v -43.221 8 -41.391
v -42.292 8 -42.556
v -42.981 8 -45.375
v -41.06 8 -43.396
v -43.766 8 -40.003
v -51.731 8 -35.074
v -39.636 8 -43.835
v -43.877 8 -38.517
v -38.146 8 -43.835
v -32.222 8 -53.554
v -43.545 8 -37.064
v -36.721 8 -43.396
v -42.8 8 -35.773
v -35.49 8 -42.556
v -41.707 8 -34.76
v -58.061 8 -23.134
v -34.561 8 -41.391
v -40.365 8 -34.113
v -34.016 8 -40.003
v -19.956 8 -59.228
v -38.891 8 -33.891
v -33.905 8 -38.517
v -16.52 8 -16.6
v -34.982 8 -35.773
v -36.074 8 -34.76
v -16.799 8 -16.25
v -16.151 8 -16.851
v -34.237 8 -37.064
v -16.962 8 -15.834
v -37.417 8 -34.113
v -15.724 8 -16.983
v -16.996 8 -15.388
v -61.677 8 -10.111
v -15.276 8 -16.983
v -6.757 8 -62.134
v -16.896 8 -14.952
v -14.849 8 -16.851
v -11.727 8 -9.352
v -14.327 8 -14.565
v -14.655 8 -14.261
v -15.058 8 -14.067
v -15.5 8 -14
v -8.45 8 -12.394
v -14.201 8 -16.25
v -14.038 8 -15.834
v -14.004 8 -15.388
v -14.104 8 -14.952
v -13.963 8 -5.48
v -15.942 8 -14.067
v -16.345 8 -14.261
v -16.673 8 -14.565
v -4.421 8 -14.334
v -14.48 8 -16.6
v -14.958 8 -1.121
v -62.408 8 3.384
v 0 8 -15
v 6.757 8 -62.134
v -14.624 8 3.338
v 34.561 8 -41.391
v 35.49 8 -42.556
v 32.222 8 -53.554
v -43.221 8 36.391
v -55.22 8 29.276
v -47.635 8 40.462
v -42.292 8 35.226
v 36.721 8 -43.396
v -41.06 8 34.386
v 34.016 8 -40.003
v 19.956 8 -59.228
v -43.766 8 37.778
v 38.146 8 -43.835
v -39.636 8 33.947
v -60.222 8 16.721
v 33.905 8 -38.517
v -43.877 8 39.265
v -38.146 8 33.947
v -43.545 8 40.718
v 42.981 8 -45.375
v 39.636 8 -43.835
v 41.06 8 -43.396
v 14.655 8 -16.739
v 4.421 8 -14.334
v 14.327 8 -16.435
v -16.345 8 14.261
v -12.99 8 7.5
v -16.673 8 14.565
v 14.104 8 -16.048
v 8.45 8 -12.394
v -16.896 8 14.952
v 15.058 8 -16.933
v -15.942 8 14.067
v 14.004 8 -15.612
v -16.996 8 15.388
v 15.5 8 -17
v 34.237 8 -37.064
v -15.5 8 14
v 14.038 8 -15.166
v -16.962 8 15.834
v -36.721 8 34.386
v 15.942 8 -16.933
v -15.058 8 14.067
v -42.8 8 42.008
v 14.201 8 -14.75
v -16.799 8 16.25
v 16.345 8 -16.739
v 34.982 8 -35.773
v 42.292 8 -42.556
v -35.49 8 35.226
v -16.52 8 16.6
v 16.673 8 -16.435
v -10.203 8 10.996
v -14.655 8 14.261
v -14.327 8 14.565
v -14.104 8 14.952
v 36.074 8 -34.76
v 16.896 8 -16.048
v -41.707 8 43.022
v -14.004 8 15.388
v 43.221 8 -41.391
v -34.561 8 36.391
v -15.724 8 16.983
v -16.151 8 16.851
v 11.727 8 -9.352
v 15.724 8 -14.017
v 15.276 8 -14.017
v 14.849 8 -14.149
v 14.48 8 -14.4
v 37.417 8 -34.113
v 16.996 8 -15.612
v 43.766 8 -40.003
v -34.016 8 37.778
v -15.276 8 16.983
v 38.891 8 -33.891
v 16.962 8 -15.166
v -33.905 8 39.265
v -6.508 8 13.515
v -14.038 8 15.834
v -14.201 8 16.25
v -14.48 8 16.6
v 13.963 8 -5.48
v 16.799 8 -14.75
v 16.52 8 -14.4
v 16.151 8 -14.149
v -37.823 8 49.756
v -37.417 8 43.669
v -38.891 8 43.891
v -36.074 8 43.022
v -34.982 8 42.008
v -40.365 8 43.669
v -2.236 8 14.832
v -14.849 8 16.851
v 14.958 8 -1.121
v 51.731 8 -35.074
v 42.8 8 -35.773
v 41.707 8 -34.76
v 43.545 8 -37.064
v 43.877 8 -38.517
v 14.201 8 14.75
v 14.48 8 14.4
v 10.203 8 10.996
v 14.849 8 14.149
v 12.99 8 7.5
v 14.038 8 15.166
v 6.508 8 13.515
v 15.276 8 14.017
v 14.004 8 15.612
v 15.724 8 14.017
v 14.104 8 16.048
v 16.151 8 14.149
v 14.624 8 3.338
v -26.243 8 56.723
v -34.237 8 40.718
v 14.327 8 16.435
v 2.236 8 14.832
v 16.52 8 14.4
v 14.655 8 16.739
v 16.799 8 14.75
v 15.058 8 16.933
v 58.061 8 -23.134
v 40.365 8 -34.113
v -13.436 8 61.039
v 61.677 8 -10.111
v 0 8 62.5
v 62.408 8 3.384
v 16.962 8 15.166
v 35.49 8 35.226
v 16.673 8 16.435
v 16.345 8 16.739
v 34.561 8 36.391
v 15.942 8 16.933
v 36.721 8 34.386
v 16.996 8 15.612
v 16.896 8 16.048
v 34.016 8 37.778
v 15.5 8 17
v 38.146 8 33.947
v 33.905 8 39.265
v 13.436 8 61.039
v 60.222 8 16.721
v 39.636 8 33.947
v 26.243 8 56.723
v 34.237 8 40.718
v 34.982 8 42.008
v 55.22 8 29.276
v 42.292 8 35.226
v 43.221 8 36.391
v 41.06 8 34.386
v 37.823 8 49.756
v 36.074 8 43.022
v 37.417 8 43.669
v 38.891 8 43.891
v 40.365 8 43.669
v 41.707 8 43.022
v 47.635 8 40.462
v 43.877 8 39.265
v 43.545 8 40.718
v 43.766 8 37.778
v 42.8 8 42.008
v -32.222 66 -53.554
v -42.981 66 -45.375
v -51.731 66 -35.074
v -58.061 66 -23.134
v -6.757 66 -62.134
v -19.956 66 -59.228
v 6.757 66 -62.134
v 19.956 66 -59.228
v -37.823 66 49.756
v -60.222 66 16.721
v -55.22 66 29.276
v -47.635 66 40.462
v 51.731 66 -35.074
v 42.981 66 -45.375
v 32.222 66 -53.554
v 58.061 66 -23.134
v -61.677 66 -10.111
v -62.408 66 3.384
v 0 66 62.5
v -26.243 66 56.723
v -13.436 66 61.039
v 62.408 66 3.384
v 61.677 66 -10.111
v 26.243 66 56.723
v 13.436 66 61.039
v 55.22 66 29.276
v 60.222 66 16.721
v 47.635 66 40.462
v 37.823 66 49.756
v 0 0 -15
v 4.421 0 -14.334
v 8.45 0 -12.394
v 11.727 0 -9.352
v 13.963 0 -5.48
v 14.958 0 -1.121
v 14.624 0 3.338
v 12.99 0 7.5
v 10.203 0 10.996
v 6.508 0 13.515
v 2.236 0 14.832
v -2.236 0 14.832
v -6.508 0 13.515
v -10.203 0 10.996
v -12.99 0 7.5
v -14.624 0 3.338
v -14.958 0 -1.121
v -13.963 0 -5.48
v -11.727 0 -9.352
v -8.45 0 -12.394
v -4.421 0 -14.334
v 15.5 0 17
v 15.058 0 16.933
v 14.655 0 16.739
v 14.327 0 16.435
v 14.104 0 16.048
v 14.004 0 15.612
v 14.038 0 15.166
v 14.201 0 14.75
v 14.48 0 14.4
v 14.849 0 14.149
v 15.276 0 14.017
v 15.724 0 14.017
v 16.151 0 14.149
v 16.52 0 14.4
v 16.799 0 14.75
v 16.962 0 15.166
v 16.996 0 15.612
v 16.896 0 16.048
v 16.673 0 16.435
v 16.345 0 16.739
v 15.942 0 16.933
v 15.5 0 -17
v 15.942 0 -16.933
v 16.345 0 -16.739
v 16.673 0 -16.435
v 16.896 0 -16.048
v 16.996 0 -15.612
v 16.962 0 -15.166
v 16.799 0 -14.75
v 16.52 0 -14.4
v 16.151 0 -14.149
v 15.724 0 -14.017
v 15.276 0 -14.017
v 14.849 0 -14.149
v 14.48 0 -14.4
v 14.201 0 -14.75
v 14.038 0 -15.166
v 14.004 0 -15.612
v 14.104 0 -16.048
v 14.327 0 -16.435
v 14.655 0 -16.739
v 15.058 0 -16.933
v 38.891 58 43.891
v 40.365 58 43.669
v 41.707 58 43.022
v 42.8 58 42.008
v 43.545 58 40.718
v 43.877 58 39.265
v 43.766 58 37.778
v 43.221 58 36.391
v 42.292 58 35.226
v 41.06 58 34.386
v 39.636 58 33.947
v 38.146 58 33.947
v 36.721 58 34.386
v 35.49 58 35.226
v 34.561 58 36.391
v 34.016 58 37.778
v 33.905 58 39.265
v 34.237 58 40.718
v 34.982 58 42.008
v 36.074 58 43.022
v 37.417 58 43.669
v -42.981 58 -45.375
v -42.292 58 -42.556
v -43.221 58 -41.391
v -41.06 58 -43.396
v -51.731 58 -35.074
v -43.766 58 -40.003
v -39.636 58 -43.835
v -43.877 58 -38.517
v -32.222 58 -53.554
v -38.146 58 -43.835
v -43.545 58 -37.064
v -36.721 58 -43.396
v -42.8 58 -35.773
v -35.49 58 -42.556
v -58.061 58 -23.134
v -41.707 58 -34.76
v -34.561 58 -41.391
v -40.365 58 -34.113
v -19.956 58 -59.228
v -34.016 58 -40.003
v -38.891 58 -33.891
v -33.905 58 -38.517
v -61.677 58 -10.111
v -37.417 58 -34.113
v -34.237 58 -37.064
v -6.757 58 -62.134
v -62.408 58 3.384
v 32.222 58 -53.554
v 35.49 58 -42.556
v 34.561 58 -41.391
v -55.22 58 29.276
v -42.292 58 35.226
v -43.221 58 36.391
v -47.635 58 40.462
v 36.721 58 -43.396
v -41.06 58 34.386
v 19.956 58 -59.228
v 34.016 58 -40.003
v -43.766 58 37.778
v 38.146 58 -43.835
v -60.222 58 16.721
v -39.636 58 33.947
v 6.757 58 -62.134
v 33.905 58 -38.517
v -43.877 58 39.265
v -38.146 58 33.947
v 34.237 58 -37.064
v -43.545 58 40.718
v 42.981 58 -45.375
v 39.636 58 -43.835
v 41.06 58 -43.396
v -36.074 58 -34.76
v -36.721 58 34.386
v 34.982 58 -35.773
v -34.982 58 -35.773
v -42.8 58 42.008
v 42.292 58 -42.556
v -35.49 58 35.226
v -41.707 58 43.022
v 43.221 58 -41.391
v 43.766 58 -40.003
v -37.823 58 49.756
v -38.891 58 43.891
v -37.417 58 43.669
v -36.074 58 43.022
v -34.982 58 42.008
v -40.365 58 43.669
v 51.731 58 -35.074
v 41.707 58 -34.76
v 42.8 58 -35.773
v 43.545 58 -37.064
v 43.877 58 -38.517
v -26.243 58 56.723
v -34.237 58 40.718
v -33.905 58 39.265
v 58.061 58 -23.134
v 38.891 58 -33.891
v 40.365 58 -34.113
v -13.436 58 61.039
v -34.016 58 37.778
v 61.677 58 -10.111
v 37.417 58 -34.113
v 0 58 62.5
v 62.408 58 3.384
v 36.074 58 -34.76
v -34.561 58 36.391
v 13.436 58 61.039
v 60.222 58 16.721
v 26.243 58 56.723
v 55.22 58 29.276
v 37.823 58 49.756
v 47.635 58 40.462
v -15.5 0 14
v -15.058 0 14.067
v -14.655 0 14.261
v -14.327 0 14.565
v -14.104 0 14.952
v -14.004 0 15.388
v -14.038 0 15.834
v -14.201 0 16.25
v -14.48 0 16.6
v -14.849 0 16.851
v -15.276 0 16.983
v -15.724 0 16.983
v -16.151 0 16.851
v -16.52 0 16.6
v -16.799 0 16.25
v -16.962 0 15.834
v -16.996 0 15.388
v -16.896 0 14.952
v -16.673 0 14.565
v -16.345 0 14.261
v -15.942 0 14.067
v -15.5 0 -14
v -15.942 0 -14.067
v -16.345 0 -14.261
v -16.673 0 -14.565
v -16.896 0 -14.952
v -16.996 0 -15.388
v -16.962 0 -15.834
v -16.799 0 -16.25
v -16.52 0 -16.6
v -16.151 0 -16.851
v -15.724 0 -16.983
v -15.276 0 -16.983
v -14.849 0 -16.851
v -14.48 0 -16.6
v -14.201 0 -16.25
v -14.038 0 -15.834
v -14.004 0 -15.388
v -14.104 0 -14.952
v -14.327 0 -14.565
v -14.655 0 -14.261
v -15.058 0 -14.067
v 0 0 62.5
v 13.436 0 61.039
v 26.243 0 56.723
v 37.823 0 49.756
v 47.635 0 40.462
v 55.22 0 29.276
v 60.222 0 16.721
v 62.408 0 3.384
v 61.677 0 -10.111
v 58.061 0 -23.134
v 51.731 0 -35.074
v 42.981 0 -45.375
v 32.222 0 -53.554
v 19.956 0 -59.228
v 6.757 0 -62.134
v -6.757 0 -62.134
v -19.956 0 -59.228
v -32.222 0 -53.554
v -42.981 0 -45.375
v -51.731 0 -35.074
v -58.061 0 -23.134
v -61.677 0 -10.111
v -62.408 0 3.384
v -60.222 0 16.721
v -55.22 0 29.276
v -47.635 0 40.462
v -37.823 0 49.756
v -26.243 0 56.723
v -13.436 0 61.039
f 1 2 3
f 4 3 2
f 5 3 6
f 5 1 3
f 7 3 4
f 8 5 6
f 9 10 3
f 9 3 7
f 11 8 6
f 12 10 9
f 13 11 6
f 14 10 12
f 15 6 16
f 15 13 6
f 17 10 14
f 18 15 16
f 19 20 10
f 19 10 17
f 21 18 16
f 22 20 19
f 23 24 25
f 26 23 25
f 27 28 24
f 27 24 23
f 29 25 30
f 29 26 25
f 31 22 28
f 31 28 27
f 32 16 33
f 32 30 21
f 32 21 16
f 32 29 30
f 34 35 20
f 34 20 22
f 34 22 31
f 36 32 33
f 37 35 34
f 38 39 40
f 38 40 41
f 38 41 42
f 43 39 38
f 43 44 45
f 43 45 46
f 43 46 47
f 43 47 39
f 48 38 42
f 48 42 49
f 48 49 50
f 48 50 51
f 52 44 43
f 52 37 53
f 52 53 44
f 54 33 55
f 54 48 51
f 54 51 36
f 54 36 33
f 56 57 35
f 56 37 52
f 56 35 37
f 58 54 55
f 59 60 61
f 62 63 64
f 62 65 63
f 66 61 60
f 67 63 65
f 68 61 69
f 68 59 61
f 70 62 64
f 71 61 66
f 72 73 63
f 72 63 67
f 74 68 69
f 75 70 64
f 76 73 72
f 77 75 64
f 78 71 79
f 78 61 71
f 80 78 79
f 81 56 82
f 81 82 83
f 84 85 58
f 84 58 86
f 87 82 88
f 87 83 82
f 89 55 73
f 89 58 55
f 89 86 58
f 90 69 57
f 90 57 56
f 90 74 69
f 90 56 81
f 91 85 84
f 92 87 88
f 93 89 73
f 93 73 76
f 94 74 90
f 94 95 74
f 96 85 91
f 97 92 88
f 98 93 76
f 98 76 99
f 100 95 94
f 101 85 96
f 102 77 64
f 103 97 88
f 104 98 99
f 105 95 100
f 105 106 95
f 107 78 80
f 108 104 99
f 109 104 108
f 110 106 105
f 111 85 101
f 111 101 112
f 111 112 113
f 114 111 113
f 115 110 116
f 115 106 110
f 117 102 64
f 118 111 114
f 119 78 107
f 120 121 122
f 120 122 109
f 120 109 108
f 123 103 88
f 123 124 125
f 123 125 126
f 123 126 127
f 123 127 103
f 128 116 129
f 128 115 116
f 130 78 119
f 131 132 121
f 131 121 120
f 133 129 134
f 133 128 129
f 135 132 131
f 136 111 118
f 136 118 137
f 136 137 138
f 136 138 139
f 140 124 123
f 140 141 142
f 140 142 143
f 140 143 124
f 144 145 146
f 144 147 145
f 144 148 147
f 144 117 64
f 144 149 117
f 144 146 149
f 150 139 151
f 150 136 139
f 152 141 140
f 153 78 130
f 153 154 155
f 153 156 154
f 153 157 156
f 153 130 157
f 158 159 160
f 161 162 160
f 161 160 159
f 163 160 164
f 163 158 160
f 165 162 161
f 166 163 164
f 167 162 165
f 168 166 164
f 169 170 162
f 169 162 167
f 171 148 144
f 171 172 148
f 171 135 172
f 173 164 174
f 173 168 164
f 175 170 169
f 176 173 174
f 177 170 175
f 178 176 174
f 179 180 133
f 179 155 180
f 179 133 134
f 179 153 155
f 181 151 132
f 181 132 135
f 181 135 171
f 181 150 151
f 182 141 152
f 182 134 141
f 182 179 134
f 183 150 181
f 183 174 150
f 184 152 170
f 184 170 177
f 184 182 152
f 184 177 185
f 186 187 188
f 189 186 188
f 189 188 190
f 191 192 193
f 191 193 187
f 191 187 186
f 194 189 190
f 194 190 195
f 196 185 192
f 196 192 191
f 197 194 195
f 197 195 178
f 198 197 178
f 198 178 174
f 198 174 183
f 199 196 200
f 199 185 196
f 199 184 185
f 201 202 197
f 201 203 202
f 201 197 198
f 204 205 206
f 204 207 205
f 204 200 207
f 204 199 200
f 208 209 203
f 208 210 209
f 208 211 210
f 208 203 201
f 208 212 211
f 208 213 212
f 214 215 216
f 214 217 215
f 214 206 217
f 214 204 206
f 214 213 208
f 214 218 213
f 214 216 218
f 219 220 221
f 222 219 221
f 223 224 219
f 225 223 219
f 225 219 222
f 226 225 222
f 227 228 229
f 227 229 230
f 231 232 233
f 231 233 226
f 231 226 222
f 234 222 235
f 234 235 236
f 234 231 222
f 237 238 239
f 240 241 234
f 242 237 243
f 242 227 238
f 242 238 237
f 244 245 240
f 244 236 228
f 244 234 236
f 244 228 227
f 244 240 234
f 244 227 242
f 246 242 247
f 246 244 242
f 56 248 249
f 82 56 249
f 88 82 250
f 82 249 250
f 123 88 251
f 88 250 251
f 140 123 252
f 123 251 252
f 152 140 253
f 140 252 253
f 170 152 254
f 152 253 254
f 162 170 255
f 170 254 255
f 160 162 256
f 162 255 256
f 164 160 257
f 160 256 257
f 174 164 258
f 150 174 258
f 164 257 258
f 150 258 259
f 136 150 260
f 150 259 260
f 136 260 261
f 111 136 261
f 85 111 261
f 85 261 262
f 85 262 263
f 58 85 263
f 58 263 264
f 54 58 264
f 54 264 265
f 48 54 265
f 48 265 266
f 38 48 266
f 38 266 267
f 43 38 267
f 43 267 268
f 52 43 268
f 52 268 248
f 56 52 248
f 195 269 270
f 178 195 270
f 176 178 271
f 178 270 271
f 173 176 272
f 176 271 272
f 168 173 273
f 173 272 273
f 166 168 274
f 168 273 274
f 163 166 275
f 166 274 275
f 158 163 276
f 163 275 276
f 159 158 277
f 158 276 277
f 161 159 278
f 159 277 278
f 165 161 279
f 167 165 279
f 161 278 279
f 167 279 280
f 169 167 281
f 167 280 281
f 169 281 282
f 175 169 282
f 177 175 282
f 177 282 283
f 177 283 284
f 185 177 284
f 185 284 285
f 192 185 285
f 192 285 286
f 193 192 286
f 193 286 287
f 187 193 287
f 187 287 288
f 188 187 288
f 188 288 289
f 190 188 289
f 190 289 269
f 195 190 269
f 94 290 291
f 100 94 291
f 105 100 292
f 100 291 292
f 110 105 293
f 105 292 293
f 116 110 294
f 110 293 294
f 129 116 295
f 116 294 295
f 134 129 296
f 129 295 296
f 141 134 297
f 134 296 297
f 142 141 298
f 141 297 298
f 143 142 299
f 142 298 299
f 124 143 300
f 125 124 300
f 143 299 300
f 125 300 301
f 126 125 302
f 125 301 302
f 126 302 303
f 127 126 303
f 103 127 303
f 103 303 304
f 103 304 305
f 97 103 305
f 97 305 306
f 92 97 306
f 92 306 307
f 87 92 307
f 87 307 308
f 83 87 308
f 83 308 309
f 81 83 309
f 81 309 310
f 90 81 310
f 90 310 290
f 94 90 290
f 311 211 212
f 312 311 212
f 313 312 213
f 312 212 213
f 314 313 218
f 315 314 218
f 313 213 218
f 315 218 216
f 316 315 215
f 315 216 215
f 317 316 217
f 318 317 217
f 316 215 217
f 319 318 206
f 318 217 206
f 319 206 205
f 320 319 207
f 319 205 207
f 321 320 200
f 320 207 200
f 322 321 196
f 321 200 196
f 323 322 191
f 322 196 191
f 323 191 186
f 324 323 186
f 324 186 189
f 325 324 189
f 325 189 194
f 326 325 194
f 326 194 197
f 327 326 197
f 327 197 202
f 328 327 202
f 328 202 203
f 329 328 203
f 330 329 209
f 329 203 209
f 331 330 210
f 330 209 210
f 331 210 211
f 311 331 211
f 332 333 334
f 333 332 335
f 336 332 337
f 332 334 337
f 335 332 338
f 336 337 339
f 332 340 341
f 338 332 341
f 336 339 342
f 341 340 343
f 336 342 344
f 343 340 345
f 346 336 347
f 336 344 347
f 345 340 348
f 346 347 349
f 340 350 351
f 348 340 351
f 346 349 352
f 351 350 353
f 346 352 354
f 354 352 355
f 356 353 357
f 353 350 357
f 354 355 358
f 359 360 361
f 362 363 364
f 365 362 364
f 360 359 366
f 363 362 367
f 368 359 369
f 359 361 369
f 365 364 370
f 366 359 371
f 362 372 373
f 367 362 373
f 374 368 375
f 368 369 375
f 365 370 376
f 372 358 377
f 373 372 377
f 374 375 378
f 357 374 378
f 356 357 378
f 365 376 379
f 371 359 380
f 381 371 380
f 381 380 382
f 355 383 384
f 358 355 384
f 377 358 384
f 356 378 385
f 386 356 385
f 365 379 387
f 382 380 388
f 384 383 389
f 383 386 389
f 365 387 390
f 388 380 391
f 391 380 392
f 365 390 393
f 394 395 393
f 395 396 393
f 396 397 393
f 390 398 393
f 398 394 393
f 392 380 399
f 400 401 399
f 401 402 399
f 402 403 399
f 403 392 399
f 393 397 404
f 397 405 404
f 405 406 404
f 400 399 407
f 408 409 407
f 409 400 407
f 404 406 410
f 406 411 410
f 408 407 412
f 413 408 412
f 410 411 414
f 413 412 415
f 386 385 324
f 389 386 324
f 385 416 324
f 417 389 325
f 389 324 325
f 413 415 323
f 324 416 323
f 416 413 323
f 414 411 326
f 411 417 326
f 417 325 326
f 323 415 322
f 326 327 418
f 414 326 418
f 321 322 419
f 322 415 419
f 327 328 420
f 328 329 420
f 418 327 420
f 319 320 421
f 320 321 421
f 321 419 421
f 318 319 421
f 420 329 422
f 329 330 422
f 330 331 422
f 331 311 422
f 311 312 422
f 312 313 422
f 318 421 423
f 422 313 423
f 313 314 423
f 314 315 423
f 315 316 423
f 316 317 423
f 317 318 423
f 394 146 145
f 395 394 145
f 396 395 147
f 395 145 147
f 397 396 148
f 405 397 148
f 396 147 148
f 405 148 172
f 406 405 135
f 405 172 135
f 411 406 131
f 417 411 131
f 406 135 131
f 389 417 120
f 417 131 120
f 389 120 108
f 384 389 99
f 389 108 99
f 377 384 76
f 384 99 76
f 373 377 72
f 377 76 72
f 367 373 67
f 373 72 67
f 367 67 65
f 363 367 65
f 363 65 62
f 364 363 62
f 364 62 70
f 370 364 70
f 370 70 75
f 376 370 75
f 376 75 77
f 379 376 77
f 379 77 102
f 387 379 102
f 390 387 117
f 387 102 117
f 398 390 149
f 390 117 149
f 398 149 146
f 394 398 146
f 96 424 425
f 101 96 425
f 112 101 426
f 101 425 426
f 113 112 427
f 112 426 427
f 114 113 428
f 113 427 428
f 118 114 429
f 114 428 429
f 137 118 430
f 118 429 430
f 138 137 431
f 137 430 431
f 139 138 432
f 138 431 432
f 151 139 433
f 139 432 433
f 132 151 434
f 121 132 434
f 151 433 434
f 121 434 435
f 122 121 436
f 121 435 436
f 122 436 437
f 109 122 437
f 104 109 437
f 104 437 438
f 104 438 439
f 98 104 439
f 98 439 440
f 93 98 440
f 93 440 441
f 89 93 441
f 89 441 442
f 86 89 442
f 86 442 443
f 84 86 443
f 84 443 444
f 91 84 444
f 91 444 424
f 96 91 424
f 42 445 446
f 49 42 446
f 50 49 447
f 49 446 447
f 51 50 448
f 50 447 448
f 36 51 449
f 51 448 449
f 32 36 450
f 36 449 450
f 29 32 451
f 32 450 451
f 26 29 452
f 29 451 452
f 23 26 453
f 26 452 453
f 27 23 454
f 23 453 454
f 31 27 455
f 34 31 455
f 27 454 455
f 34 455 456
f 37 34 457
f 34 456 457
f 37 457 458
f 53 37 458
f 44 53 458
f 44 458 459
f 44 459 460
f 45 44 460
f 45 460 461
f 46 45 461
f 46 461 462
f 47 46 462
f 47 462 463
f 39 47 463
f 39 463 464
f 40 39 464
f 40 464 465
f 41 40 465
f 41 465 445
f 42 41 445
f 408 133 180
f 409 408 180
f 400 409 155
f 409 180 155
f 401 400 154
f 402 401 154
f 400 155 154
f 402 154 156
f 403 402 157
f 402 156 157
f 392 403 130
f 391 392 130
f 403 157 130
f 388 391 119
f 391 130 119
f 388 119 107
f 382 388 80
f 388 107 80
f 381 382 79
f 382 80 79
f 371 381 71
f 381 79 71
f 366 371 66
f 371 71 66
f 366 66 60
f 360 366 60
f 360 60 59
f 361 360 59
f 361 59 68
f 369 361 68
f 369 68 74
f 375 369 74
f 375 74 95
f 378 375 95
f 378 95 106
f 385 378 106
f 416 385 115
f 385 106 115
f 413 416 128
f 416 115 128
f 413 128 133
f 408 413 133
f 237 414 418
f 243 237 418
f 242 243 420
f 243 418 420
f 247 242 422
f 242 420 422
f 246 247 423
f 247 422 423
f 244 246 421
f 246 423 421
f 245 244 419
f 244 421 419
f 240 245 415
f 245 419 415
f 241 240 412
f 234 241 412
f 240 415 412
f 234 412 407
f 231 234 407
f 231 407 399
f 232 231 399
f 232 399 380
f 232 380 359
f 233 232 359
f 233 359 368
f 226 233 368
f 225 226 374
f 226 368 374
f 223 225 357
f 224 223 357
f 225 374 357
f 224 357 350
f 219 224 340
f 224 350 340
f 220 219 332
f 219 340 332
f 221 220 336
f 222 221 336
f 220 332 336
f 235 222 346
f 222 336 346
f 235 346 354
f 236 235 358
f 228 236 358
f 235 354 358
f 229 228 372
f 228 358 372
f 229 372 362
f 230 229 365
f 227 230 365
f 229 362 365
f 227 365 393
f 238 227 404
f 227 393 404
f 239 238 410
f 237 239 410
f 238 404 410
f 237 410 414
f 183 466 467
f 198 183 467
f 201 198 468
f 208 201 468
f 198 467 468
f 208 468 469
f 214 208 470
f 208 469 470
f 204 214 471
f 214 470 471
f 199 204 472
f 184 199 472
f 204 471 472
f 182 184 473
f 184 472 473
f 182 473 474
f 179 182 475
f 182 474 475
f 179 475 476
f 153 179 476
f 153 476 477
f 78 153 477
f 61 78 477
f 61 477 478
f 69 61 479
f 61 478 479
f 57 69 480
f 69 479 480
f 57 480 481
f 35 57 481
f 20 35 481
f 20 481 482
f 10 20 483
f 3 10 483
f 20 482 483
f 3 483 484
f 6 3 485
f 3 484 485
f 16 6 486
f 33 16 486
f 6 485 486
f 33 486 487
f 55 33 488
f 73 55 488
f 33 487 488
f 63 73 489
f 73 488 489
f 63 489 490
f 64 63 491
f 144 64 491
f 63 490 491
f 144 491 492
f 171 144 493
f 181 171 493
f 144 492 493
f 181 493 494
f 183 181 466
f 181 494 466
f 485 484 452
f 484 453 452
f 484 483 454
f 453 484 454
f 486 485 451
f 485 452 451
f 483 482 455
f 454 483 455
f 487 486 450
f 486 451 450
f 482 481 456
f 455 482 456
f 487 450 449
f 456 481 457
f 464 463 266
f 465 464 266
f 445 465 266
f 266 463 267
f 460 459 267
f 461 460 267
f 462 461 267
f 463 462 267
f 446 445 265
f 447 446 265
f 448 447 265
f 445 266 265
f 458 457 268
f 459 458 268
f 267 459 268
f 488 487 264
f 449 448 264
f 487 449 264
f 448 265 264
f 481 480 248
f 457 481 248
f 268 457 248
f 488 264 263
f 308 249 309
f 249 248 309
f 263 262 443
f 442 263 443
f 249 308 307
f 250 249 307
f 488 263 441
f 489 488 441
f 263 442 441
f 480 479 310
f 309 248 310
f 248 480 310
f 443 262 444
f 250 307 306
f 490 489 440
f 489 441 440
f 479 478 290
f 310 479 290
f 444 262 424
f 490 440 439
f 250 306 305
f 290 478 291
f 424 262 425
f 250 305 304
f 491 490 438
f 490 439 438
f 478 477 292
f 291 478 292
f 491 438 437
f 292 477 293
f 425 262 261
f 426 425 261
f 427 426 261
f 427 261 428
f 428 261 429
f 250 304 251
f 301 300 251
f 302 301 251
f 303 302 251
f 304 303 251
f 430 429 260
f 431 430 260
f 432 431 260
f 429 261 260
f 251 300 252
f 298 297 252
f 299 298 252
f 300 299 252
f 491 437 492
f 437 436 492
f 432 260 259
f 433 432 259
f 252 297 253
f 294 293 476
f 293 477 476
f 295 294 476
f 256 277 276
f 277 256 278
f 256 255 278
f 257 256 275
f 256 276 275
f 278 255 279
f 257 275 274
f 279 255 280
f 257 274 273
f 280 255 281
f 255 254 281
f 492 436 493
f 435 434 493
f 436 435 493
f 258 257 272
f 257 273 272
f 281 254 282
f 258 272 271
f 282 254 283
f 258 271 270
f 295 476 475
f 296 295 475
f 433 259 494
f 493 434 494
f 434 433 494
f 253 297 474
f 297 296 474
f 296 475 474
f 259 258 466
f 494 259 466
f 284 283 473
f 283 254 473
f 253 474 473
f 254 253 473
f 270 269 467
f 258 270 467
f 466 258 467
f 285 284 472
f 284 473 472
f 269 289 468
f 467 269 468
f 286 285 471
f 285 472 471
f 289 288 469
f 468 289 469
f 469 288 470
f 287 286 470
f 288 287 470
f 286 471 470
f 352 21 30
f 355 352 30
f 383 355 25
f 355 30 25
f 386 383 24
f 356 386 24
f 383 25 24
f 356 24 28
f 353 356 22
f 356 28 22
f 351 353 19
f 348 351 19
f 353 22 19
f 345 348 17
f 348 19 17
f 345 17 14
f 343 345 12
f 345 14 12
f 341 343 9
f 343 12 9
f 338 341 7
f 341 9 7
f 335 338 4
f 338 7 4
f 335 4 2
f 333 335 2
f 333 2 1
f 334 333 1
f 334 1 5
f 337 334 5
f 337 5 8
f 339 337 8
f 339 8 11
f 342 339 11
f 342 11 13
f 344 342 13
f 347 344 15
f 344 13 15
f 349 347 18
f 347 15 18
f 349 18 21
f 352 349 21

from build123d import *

# Parameters (mm, degrees)
SKETCH_2_R          = 62.5
EXTRUDE_1_DEPTH     = 8
SKETCH_3_R          = 5
EXTRUDE_2_DEPTH     = 50
SKETCH_4_R          = 62.5
EXTRUDE_3_DEPTH     = 8
CUT_EXTRUDE_1_REACH = 112.311
SKETCH_5_R          = 15
CUT_EXTRUDE_2_REACH = 112.311
SKETCH_6_R          = 1.5


with BuildPart() as part:
    # 草图2 → 凸台-拉伸1 (new body)
    with BuildSketch(Plane(origin=(0, 0, 0), x_dir=(1, 0, 0), z_dir=(0, 1, 0))):
        with Locations(Location((0, 0, 0), (0, 0, 270))):
            Circle(SKETCH_2_R)
    extrude(amount=EXTRUDE_1_DEPTH)

    # 草图3 → 凸台-拉伸2 (add)
    with BuildSketch(Plane(origin=(0, 8, 0), x_dir=(1, 0, 0), z_dir=(0, 1, 0))):
        with Locations(Location((38.890872965, 38.890872965, 0), (0, 0, 270))):
            Circle(SKETCH_3_R)
        with Locations(Location((38.890872965, -38.890872965, 0), (0, 0, 270))):
            Circle(SKETCH_3_R)
        with Locations(Location((-38.890872965, -38.890872965, 0), (0, 0, 270))):
            Circle(SKETCH_3_R)
        with Locations(Location((-38.890872965, 38.890872965, 0), (0, 0, 270))):
            Circle(SKETCH_3_R)
    extrude(amount=EXTRUDE_2_DEPTH)

    # 草图4 → 凸台-拉伸3 (add)
    with BuildSketch(Plane(origin=(0, 58, 0), x_dir=(1, 0, 0), z_dir=(0, 1, 0))):
        with Locations(Location((0, 0, 0), (0, 0, 270))):
            Circle(SKETCH_4_R)
    extrude(amount=EXTRUDE_3_DEPTH)

    # 草图5 → 切除-拉伸1 (cut, up to next)
    with BuildSketch(Plane.XZ, mode=Mode.PRIVATE) as cut_extrude_1_sk1:
        with Locations(Location((0, 0, 0), (0, 0, 270))):
            Circle(SKETCH_5_R)
    cut_extrude_1_tool1 = extrude(cut_extrude_1_sk1.sketch, amount=-CUT_EXTRUDE_1_REACH, mode=Mode.PRIVATE) & part.part
    add(cut_extrude_1_tool1.solids().sort_by_distance((0, 0, 0))[0], mode=Mode.SUBTRACT)

    # 草图6 → 切除-拉伸2 (cut, up to next)
    with BuildSketch(Plane(origin=(0, 0, 0), x_dir=(-1, 0, 0), z_dir=(0, -1, 0)), mode=Mode.PRIVATE) as cut_extrude_2_sk1:
        with Locations(Location((15.5, -15.5, 0), (0, 0, 90))):
            Circle(SKETCH_6_R)
    cut_extrude_2_tool1 = extrude(cut_extrude_2_sk1.sketch, amount=-CUT_EXTRUDE_2_REACH, mode=Mode.PRIVATE) & part.part
    # 草图6 → 切除-拉伸2 (cut, up to next)
    with BuildSketch(Plane(origin=(0, 0, 0), x_dir=(-1, 0, 0), z_dir=(0, -1, 0)), mode=Mode.PRIVATE) as cut_extrude_2_sk2:
        with Locations(Location((15.5, 15.5, 0), (0, 0, 270))):
            Circle(SKETCH_6_R)
    cut_extrude_2_tool2 = extrude(cut_extrude_2_sk2.sketch, amount=-CUT_EXTRUDE_2_REACH, mode=Mode.PRIVATE) & part.part
    # 草图6 → 切除-拉伸2 (cut, up to next)
    with BuildSketch(Plane(origin=(0, 0, 0), x_dir=(-1, 0, 0), z_dir=(0, -1, 0)), mode=Mode.PRIVATE) as cut_extrude_2_sk3:
        with Locations(Location((-15.5, -15.5, 0), (0, 0, 270))):
            Circle(SKETCH_6_R)
    cut_extrude_2_tool3 = extrude(cut_extrude_2_sk3.sketch, amount=-CUT_EXTRUDE_2_REACH, mode=Mode.PRIVATE) & part.part
    # 草图6 → 切除-拉伸2 (cut, up to next)
    with BuildSketch(Plane(origin=(0, 0, 0), x_dir=(-1, 0, 0), z_dir=(0, -1, 0)), mode=Mode.PRIVATE) as cut_extrude_2_sk4:
        with Locations(Location((-15.5, 15.5, 0), (0, 0, 90))):
            Circle(SKETCH_6_R)
    cut_extrude_2_tool4 = extrude(cut_extrude_2_sk4.sketch, amount=-CUT_EXTRUDE_2_REACH, mode=Mode.PRIVATE) & part.part
    add(cut_extrude_2_tool1.solids().sort_by_distance((-15.5, 0, 15.5))[0], mode=Mode.SUBTRACT)
    add(cut_extrude_2_tool2.solids().sort_by_distance((-15.5, 0, -15.5))[0], mode=Mode.SUBTRACT)
    add(cut_extrude_2_tool3.solids().sort_by_distance((15.5, 0, 15.5))[0], mode=Mode.SUBTRACT)
    add(cut_extrude_2_tool4.solids().sort_by_distance((15.5, 0, -15.5))[0], mode=Mode.SUBTRACT)


solid = part.part
